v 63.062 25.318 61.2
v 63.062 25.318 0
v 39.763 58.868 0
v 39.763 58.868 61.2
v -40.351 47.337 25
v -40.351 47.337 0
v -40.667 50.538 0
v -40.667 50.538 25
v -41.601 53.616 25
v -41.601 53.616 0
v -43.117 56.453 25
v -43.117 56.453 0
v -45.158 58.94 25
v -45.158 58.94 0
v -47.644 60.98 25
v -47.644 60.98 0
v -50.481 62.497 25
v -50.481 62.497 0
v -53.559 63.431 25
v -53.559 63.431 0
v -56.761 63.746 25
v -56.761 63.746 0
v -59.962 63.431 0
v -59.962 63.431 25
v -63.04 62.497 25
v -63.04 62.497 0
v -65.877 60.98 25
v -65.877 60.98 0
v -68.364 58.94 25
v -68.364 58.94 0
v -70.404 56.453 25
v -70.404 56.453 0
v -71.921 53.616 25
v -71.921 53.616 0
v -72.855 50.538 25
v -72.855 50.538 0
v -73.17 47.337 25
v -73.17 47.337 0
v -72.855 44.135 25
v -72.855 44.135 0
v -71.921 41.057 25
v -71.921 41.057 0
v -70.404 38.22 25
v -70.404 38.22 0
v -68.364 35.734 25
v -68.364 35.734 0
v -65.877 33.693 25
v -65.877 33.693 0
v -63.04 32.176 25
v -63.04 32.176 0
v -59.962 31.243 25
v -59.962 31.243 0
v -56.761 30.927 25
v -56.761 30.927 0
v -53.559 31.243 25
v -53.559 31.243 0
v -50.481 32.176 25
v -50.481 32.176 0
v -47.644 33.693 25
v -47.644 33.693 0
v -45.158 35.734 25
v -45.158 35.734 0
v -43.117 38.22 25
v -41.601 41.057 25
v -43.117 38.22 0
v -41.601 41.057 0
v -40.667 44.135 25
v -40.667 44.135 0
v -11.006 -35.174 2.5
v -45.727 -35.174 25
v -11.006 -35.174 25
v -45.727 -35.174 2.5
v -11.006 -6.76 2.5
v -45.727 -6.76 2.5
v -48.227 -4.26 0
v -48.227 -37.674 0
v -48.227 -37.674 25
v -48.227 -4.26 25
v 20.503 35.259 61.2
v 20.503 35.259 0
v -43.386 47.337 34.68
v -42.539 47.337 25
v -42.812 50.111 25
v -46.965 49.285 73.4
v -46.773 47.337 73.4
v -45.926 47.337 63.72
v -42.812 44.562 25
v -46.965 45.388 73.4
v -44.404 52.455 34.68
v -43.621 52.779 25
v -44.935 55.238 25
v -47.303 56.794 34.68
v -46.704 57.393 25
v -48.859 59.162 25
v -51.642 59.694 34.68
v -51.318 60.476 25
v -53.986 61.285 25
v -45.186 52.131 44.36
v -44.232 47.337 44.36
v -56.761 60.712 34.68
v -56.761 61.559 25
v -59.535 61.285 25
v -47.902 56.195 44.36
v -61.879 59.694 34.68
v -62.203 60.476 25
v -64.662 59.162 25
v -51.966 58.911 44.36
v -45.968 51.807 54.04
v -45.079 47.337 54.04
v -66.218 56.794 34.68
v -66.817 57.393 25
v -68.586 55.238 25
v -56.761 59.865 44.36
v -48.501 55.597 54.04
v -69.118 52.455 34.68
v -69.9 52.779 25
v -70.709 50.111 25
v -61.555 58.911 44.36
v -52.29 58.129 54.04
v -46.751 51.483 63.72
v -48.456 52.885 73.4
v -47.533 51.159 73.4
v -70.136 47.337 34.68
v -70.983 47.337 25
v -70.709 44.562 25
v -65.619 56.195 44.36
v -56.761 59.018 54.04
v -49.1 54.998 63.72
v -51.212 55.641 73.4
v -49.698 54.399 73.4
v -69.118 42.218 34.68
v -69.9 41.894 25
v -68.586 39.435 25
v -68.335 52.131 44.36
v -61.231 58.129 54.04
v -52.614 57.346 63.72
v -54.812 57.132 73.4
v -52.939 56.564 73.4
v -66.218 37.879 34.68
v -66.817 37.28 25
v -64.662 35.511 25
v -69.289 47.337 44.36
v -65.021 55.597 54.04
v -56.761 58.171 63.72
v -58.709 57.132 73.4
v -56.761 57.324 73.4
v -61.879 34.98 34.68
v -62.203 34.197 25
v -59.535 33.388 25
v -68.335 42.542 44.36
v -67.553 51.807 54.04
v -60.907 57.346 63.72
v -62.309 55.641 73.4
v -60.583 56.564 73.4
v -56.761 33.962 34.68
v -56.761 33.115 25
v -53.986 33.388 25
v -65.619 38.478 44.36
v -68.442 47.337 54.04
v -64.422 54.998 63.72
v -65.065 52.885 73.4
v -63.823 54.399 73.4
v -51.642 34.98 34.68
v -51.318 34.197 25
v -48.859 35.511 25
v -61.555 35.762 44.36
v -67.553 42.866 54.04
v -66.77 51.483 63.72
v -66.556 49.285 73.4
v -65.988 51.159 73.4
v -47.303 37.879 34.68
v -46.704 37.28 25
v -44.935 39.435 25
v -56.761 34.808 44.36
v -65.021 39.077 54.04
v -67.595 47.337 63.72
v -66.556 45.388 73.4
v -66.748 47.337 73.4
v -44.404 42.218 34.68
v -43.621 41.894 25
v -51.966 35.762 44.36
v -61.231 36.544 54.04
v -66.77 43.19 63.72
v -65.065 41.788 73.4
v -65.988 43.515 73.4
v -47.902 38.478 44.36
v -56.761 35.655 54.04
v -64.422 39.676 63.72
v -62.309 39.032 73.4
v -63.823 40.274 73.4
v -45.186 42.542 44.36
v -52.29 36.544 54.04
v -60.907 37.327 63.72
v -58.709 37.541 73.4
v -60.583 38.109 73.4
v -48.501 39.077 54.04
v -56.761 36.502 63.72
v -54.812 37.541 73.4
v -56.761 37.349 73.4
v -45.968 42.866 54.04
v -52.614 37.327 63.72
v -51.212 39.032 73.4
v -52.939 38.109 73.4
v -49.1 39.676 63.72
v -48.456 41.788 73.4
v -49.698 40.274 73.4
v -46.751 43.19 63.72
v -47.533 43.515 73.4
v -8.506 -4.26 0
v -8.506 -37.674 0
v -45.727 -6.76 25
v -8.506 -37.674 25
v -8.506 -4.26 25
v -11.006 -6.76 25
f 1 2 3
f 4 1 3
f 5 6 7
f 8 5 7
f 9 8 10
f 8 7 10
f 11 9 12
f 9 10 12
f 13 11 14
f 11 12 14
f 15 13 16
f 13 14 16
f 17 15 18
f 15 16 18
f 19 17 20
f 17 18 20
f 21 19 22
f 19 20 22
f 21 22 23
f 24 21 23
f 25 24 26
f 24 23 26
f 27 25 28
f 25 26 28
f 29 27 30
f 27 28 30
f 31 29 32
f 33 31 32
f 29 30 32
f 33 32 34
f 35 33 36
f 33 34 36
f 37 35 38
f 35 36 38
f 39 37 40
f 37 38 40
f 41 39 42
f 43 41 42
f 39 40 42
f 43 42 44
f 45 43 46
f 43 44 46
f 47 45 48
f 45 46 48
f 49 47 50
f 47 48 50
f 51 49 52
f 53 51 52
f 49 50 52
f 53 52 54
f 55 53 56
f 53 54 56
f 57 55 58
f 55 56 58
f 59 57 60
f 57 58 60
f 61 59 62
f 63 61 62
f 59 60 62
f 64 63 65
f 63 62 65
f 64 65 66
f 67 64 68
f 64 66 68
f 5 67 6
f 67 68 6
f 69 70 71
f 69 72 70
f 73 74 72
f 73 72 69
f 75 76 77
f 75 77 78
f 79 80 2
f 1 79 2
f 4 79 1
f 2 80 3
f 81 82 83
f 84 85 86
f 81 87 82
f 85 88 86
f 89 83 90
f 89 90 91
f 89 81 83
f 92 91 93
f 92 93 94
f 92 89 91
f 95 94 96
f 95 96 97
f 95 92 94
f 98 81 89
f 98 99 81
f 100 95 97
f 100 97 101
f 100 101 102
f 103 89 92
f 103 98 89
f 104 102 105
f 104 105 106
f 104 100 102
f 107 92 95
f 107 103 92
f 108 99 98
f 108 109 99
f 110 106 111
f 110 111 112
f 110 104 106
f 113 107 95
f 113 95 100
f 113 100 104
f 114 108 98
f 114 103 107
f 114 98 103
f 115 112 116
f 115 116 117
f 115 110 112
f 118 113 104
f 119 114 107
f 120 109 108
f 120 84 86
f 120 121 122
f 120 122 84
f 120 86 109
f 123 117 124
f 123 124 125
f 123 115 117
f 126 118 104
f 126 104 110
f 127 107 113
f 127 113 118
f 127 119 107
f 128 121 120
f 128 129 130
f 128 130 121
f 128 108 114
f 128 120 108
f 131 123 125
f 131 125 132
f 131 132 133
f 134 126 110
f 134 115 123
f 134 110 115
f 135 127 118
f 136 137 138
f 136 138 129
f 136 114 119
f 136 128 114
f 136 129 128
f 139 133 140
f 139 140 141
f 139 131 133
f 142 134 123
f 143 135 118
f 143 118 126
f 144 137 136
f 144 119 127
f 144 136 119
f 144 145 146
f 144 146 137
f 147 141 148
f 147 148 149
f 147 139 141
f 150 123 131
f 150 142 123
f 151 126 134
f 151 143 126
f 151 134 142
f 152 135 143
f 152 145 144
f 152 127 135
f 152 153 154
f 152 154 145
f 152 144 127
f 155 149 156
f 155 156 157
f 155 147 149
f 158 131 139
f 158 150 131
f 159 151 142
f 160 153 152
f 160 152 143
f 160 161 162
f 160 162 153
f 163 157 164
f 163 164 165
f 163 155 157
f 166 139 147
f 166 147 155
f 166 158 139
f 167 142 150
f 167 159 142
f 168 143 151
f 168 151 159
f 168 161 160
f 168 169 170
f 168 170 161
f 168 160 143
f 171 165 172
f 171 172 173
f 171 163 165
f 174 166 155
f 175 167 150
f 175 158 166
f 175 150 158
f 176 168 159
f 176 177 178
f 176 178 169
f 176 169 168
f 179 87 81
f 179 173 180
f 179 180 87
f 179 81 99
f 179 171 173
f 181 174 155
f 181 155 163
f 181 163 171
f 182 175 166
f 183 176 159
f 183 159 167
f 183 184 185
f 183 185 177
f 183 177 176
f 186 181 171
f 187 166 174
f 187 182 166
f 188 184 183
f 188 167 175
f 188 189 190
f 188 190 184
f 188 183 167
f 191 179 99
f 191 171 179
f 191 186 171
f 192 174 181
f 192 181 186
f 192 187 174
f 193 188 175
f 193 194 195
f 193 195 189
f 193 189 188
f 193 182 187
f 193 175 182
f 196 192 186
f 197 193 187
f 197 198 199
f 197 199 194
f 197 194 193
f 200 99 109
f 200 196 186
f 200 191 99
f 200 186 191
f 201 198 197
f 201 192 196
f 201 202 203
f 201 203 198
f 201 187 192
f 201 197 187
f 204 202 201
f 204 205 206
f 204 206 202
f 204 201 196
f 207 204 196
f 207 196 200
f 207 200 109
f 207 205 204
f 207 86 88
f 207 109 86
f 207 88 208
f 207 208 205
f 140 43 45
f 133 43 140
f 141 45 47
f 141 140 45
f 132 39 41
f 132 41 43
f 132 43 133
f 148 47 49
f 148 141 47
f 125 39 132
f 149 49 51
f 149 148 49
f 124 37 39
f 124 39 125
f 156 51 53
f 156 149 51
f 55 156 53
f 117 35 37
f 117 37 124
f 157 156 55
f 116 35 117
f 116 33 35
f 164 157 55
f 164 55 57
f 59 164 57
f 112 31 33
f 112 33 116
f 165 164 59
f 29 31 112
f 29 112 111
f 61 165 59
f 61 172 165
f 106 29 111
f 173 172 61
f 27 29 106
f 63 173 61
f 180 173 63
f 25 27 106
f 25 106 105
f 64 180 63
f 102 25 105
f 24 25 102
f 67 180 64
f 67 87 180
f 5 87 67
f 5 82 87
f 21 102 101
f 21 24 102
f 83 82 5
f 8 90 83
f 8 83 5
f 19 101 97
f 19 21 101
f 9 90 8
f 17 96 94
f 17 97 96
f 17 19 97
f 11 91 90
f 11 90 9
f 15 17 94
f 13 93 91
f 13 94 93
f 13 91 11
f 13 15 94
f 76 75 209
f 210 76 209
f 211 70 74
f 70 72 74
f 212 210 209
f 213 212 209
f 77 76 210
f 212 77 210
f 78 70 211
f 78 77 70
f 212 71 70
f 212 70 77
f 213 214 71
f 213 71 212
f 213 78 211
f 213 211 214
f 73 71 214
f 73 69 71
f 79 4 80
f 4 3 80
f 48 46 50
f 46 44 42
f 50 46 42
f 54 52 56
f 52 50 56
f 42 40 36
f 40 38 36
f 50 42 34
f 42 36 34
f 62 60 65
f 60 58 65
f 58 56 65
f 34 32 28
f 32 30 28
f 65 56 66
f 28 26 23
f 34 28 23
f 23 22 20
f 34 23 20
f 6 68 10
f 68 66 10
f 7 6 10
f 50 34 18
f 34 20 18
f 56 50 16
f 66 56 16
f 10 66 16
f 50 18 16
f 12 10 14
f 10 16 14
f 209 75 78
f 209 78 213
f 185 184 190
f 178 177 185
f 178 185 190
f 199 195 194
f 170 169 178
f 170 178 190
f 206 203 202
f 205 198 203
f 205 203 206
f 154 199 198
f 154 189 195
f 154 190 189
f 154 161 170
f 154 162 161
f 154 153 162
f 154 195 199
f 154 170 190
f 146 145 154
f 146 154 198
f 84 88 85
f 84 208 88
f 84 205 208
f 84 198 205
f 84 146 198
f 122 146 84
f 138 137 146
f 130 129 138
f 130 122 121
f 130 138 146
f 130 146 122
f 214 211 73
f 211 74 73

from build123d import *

# Parameters (mm, degrees)
F0_R     = 16.4092437042
F1_DEPTH = 73.4
F1_TAPER = 5
F2_DEPTH = 25
F0_W     = 39.7206880152
F0_H     = 33.4140998311
F3_T     = -2.5
F4_DEPTH = 36.2


with BuildPart() as f1:
    # F0 (on Top) → F1 (new body)
    with BuildSketch(Plane.XY):
        with Locations((-56.7606650293, 47.3366566002)):
            Circle(F0_R)
    extrude(amount=F1_DEPTH, taper=F1_TAPER)

    # F0 (on Top) → F2 (join)
    with BuildSketch(Plane.XY):
        with Locations((-56.7606650293, 47.3366566002)):
            Circle(F0_R)
    extrude(amount=F2_DEPTH)


with BuildPart() as f2:
    # F0 (on Top) → F2, piece 2 (new body)
    with BuildSketch(Plane.XY):
        with Locations((-28.3664483577, -20.966904005)):
            Rectangle(F0_W, F0_H)
    extrude(amount=F2_DEPTH)

    # F3
    f3_openings = [f2.faces().sort_by_distance(p)[0] for p in [
        (-28.366448, -20.966904, 25),
    ]]
    offset(amount=F3_T, openings=f3_openings)


with BuildPart() as f2b:
    # F0 (on Top) → F2, piece 3 (new body)
    with BuildSketch(Plane.XY):
        Polygon((63.0621388555, 25.3180470318), (39.7633165121, 58.8683485985), (20.5029565841, 35.2588780224), align=None)
    extrude(amount=F2_DEPTH)

    # F4 (add): a face of the model
    f4_faces = [f2b.faces().sort_by_distance(p)[0] for p in [
        (41.1094706506, 39.8150912176, 25),
    ]]
    extrude(f4_faces, amount=F4_DEPTH)


solid = Compound([f1.part, f2.part, f2b.part])
